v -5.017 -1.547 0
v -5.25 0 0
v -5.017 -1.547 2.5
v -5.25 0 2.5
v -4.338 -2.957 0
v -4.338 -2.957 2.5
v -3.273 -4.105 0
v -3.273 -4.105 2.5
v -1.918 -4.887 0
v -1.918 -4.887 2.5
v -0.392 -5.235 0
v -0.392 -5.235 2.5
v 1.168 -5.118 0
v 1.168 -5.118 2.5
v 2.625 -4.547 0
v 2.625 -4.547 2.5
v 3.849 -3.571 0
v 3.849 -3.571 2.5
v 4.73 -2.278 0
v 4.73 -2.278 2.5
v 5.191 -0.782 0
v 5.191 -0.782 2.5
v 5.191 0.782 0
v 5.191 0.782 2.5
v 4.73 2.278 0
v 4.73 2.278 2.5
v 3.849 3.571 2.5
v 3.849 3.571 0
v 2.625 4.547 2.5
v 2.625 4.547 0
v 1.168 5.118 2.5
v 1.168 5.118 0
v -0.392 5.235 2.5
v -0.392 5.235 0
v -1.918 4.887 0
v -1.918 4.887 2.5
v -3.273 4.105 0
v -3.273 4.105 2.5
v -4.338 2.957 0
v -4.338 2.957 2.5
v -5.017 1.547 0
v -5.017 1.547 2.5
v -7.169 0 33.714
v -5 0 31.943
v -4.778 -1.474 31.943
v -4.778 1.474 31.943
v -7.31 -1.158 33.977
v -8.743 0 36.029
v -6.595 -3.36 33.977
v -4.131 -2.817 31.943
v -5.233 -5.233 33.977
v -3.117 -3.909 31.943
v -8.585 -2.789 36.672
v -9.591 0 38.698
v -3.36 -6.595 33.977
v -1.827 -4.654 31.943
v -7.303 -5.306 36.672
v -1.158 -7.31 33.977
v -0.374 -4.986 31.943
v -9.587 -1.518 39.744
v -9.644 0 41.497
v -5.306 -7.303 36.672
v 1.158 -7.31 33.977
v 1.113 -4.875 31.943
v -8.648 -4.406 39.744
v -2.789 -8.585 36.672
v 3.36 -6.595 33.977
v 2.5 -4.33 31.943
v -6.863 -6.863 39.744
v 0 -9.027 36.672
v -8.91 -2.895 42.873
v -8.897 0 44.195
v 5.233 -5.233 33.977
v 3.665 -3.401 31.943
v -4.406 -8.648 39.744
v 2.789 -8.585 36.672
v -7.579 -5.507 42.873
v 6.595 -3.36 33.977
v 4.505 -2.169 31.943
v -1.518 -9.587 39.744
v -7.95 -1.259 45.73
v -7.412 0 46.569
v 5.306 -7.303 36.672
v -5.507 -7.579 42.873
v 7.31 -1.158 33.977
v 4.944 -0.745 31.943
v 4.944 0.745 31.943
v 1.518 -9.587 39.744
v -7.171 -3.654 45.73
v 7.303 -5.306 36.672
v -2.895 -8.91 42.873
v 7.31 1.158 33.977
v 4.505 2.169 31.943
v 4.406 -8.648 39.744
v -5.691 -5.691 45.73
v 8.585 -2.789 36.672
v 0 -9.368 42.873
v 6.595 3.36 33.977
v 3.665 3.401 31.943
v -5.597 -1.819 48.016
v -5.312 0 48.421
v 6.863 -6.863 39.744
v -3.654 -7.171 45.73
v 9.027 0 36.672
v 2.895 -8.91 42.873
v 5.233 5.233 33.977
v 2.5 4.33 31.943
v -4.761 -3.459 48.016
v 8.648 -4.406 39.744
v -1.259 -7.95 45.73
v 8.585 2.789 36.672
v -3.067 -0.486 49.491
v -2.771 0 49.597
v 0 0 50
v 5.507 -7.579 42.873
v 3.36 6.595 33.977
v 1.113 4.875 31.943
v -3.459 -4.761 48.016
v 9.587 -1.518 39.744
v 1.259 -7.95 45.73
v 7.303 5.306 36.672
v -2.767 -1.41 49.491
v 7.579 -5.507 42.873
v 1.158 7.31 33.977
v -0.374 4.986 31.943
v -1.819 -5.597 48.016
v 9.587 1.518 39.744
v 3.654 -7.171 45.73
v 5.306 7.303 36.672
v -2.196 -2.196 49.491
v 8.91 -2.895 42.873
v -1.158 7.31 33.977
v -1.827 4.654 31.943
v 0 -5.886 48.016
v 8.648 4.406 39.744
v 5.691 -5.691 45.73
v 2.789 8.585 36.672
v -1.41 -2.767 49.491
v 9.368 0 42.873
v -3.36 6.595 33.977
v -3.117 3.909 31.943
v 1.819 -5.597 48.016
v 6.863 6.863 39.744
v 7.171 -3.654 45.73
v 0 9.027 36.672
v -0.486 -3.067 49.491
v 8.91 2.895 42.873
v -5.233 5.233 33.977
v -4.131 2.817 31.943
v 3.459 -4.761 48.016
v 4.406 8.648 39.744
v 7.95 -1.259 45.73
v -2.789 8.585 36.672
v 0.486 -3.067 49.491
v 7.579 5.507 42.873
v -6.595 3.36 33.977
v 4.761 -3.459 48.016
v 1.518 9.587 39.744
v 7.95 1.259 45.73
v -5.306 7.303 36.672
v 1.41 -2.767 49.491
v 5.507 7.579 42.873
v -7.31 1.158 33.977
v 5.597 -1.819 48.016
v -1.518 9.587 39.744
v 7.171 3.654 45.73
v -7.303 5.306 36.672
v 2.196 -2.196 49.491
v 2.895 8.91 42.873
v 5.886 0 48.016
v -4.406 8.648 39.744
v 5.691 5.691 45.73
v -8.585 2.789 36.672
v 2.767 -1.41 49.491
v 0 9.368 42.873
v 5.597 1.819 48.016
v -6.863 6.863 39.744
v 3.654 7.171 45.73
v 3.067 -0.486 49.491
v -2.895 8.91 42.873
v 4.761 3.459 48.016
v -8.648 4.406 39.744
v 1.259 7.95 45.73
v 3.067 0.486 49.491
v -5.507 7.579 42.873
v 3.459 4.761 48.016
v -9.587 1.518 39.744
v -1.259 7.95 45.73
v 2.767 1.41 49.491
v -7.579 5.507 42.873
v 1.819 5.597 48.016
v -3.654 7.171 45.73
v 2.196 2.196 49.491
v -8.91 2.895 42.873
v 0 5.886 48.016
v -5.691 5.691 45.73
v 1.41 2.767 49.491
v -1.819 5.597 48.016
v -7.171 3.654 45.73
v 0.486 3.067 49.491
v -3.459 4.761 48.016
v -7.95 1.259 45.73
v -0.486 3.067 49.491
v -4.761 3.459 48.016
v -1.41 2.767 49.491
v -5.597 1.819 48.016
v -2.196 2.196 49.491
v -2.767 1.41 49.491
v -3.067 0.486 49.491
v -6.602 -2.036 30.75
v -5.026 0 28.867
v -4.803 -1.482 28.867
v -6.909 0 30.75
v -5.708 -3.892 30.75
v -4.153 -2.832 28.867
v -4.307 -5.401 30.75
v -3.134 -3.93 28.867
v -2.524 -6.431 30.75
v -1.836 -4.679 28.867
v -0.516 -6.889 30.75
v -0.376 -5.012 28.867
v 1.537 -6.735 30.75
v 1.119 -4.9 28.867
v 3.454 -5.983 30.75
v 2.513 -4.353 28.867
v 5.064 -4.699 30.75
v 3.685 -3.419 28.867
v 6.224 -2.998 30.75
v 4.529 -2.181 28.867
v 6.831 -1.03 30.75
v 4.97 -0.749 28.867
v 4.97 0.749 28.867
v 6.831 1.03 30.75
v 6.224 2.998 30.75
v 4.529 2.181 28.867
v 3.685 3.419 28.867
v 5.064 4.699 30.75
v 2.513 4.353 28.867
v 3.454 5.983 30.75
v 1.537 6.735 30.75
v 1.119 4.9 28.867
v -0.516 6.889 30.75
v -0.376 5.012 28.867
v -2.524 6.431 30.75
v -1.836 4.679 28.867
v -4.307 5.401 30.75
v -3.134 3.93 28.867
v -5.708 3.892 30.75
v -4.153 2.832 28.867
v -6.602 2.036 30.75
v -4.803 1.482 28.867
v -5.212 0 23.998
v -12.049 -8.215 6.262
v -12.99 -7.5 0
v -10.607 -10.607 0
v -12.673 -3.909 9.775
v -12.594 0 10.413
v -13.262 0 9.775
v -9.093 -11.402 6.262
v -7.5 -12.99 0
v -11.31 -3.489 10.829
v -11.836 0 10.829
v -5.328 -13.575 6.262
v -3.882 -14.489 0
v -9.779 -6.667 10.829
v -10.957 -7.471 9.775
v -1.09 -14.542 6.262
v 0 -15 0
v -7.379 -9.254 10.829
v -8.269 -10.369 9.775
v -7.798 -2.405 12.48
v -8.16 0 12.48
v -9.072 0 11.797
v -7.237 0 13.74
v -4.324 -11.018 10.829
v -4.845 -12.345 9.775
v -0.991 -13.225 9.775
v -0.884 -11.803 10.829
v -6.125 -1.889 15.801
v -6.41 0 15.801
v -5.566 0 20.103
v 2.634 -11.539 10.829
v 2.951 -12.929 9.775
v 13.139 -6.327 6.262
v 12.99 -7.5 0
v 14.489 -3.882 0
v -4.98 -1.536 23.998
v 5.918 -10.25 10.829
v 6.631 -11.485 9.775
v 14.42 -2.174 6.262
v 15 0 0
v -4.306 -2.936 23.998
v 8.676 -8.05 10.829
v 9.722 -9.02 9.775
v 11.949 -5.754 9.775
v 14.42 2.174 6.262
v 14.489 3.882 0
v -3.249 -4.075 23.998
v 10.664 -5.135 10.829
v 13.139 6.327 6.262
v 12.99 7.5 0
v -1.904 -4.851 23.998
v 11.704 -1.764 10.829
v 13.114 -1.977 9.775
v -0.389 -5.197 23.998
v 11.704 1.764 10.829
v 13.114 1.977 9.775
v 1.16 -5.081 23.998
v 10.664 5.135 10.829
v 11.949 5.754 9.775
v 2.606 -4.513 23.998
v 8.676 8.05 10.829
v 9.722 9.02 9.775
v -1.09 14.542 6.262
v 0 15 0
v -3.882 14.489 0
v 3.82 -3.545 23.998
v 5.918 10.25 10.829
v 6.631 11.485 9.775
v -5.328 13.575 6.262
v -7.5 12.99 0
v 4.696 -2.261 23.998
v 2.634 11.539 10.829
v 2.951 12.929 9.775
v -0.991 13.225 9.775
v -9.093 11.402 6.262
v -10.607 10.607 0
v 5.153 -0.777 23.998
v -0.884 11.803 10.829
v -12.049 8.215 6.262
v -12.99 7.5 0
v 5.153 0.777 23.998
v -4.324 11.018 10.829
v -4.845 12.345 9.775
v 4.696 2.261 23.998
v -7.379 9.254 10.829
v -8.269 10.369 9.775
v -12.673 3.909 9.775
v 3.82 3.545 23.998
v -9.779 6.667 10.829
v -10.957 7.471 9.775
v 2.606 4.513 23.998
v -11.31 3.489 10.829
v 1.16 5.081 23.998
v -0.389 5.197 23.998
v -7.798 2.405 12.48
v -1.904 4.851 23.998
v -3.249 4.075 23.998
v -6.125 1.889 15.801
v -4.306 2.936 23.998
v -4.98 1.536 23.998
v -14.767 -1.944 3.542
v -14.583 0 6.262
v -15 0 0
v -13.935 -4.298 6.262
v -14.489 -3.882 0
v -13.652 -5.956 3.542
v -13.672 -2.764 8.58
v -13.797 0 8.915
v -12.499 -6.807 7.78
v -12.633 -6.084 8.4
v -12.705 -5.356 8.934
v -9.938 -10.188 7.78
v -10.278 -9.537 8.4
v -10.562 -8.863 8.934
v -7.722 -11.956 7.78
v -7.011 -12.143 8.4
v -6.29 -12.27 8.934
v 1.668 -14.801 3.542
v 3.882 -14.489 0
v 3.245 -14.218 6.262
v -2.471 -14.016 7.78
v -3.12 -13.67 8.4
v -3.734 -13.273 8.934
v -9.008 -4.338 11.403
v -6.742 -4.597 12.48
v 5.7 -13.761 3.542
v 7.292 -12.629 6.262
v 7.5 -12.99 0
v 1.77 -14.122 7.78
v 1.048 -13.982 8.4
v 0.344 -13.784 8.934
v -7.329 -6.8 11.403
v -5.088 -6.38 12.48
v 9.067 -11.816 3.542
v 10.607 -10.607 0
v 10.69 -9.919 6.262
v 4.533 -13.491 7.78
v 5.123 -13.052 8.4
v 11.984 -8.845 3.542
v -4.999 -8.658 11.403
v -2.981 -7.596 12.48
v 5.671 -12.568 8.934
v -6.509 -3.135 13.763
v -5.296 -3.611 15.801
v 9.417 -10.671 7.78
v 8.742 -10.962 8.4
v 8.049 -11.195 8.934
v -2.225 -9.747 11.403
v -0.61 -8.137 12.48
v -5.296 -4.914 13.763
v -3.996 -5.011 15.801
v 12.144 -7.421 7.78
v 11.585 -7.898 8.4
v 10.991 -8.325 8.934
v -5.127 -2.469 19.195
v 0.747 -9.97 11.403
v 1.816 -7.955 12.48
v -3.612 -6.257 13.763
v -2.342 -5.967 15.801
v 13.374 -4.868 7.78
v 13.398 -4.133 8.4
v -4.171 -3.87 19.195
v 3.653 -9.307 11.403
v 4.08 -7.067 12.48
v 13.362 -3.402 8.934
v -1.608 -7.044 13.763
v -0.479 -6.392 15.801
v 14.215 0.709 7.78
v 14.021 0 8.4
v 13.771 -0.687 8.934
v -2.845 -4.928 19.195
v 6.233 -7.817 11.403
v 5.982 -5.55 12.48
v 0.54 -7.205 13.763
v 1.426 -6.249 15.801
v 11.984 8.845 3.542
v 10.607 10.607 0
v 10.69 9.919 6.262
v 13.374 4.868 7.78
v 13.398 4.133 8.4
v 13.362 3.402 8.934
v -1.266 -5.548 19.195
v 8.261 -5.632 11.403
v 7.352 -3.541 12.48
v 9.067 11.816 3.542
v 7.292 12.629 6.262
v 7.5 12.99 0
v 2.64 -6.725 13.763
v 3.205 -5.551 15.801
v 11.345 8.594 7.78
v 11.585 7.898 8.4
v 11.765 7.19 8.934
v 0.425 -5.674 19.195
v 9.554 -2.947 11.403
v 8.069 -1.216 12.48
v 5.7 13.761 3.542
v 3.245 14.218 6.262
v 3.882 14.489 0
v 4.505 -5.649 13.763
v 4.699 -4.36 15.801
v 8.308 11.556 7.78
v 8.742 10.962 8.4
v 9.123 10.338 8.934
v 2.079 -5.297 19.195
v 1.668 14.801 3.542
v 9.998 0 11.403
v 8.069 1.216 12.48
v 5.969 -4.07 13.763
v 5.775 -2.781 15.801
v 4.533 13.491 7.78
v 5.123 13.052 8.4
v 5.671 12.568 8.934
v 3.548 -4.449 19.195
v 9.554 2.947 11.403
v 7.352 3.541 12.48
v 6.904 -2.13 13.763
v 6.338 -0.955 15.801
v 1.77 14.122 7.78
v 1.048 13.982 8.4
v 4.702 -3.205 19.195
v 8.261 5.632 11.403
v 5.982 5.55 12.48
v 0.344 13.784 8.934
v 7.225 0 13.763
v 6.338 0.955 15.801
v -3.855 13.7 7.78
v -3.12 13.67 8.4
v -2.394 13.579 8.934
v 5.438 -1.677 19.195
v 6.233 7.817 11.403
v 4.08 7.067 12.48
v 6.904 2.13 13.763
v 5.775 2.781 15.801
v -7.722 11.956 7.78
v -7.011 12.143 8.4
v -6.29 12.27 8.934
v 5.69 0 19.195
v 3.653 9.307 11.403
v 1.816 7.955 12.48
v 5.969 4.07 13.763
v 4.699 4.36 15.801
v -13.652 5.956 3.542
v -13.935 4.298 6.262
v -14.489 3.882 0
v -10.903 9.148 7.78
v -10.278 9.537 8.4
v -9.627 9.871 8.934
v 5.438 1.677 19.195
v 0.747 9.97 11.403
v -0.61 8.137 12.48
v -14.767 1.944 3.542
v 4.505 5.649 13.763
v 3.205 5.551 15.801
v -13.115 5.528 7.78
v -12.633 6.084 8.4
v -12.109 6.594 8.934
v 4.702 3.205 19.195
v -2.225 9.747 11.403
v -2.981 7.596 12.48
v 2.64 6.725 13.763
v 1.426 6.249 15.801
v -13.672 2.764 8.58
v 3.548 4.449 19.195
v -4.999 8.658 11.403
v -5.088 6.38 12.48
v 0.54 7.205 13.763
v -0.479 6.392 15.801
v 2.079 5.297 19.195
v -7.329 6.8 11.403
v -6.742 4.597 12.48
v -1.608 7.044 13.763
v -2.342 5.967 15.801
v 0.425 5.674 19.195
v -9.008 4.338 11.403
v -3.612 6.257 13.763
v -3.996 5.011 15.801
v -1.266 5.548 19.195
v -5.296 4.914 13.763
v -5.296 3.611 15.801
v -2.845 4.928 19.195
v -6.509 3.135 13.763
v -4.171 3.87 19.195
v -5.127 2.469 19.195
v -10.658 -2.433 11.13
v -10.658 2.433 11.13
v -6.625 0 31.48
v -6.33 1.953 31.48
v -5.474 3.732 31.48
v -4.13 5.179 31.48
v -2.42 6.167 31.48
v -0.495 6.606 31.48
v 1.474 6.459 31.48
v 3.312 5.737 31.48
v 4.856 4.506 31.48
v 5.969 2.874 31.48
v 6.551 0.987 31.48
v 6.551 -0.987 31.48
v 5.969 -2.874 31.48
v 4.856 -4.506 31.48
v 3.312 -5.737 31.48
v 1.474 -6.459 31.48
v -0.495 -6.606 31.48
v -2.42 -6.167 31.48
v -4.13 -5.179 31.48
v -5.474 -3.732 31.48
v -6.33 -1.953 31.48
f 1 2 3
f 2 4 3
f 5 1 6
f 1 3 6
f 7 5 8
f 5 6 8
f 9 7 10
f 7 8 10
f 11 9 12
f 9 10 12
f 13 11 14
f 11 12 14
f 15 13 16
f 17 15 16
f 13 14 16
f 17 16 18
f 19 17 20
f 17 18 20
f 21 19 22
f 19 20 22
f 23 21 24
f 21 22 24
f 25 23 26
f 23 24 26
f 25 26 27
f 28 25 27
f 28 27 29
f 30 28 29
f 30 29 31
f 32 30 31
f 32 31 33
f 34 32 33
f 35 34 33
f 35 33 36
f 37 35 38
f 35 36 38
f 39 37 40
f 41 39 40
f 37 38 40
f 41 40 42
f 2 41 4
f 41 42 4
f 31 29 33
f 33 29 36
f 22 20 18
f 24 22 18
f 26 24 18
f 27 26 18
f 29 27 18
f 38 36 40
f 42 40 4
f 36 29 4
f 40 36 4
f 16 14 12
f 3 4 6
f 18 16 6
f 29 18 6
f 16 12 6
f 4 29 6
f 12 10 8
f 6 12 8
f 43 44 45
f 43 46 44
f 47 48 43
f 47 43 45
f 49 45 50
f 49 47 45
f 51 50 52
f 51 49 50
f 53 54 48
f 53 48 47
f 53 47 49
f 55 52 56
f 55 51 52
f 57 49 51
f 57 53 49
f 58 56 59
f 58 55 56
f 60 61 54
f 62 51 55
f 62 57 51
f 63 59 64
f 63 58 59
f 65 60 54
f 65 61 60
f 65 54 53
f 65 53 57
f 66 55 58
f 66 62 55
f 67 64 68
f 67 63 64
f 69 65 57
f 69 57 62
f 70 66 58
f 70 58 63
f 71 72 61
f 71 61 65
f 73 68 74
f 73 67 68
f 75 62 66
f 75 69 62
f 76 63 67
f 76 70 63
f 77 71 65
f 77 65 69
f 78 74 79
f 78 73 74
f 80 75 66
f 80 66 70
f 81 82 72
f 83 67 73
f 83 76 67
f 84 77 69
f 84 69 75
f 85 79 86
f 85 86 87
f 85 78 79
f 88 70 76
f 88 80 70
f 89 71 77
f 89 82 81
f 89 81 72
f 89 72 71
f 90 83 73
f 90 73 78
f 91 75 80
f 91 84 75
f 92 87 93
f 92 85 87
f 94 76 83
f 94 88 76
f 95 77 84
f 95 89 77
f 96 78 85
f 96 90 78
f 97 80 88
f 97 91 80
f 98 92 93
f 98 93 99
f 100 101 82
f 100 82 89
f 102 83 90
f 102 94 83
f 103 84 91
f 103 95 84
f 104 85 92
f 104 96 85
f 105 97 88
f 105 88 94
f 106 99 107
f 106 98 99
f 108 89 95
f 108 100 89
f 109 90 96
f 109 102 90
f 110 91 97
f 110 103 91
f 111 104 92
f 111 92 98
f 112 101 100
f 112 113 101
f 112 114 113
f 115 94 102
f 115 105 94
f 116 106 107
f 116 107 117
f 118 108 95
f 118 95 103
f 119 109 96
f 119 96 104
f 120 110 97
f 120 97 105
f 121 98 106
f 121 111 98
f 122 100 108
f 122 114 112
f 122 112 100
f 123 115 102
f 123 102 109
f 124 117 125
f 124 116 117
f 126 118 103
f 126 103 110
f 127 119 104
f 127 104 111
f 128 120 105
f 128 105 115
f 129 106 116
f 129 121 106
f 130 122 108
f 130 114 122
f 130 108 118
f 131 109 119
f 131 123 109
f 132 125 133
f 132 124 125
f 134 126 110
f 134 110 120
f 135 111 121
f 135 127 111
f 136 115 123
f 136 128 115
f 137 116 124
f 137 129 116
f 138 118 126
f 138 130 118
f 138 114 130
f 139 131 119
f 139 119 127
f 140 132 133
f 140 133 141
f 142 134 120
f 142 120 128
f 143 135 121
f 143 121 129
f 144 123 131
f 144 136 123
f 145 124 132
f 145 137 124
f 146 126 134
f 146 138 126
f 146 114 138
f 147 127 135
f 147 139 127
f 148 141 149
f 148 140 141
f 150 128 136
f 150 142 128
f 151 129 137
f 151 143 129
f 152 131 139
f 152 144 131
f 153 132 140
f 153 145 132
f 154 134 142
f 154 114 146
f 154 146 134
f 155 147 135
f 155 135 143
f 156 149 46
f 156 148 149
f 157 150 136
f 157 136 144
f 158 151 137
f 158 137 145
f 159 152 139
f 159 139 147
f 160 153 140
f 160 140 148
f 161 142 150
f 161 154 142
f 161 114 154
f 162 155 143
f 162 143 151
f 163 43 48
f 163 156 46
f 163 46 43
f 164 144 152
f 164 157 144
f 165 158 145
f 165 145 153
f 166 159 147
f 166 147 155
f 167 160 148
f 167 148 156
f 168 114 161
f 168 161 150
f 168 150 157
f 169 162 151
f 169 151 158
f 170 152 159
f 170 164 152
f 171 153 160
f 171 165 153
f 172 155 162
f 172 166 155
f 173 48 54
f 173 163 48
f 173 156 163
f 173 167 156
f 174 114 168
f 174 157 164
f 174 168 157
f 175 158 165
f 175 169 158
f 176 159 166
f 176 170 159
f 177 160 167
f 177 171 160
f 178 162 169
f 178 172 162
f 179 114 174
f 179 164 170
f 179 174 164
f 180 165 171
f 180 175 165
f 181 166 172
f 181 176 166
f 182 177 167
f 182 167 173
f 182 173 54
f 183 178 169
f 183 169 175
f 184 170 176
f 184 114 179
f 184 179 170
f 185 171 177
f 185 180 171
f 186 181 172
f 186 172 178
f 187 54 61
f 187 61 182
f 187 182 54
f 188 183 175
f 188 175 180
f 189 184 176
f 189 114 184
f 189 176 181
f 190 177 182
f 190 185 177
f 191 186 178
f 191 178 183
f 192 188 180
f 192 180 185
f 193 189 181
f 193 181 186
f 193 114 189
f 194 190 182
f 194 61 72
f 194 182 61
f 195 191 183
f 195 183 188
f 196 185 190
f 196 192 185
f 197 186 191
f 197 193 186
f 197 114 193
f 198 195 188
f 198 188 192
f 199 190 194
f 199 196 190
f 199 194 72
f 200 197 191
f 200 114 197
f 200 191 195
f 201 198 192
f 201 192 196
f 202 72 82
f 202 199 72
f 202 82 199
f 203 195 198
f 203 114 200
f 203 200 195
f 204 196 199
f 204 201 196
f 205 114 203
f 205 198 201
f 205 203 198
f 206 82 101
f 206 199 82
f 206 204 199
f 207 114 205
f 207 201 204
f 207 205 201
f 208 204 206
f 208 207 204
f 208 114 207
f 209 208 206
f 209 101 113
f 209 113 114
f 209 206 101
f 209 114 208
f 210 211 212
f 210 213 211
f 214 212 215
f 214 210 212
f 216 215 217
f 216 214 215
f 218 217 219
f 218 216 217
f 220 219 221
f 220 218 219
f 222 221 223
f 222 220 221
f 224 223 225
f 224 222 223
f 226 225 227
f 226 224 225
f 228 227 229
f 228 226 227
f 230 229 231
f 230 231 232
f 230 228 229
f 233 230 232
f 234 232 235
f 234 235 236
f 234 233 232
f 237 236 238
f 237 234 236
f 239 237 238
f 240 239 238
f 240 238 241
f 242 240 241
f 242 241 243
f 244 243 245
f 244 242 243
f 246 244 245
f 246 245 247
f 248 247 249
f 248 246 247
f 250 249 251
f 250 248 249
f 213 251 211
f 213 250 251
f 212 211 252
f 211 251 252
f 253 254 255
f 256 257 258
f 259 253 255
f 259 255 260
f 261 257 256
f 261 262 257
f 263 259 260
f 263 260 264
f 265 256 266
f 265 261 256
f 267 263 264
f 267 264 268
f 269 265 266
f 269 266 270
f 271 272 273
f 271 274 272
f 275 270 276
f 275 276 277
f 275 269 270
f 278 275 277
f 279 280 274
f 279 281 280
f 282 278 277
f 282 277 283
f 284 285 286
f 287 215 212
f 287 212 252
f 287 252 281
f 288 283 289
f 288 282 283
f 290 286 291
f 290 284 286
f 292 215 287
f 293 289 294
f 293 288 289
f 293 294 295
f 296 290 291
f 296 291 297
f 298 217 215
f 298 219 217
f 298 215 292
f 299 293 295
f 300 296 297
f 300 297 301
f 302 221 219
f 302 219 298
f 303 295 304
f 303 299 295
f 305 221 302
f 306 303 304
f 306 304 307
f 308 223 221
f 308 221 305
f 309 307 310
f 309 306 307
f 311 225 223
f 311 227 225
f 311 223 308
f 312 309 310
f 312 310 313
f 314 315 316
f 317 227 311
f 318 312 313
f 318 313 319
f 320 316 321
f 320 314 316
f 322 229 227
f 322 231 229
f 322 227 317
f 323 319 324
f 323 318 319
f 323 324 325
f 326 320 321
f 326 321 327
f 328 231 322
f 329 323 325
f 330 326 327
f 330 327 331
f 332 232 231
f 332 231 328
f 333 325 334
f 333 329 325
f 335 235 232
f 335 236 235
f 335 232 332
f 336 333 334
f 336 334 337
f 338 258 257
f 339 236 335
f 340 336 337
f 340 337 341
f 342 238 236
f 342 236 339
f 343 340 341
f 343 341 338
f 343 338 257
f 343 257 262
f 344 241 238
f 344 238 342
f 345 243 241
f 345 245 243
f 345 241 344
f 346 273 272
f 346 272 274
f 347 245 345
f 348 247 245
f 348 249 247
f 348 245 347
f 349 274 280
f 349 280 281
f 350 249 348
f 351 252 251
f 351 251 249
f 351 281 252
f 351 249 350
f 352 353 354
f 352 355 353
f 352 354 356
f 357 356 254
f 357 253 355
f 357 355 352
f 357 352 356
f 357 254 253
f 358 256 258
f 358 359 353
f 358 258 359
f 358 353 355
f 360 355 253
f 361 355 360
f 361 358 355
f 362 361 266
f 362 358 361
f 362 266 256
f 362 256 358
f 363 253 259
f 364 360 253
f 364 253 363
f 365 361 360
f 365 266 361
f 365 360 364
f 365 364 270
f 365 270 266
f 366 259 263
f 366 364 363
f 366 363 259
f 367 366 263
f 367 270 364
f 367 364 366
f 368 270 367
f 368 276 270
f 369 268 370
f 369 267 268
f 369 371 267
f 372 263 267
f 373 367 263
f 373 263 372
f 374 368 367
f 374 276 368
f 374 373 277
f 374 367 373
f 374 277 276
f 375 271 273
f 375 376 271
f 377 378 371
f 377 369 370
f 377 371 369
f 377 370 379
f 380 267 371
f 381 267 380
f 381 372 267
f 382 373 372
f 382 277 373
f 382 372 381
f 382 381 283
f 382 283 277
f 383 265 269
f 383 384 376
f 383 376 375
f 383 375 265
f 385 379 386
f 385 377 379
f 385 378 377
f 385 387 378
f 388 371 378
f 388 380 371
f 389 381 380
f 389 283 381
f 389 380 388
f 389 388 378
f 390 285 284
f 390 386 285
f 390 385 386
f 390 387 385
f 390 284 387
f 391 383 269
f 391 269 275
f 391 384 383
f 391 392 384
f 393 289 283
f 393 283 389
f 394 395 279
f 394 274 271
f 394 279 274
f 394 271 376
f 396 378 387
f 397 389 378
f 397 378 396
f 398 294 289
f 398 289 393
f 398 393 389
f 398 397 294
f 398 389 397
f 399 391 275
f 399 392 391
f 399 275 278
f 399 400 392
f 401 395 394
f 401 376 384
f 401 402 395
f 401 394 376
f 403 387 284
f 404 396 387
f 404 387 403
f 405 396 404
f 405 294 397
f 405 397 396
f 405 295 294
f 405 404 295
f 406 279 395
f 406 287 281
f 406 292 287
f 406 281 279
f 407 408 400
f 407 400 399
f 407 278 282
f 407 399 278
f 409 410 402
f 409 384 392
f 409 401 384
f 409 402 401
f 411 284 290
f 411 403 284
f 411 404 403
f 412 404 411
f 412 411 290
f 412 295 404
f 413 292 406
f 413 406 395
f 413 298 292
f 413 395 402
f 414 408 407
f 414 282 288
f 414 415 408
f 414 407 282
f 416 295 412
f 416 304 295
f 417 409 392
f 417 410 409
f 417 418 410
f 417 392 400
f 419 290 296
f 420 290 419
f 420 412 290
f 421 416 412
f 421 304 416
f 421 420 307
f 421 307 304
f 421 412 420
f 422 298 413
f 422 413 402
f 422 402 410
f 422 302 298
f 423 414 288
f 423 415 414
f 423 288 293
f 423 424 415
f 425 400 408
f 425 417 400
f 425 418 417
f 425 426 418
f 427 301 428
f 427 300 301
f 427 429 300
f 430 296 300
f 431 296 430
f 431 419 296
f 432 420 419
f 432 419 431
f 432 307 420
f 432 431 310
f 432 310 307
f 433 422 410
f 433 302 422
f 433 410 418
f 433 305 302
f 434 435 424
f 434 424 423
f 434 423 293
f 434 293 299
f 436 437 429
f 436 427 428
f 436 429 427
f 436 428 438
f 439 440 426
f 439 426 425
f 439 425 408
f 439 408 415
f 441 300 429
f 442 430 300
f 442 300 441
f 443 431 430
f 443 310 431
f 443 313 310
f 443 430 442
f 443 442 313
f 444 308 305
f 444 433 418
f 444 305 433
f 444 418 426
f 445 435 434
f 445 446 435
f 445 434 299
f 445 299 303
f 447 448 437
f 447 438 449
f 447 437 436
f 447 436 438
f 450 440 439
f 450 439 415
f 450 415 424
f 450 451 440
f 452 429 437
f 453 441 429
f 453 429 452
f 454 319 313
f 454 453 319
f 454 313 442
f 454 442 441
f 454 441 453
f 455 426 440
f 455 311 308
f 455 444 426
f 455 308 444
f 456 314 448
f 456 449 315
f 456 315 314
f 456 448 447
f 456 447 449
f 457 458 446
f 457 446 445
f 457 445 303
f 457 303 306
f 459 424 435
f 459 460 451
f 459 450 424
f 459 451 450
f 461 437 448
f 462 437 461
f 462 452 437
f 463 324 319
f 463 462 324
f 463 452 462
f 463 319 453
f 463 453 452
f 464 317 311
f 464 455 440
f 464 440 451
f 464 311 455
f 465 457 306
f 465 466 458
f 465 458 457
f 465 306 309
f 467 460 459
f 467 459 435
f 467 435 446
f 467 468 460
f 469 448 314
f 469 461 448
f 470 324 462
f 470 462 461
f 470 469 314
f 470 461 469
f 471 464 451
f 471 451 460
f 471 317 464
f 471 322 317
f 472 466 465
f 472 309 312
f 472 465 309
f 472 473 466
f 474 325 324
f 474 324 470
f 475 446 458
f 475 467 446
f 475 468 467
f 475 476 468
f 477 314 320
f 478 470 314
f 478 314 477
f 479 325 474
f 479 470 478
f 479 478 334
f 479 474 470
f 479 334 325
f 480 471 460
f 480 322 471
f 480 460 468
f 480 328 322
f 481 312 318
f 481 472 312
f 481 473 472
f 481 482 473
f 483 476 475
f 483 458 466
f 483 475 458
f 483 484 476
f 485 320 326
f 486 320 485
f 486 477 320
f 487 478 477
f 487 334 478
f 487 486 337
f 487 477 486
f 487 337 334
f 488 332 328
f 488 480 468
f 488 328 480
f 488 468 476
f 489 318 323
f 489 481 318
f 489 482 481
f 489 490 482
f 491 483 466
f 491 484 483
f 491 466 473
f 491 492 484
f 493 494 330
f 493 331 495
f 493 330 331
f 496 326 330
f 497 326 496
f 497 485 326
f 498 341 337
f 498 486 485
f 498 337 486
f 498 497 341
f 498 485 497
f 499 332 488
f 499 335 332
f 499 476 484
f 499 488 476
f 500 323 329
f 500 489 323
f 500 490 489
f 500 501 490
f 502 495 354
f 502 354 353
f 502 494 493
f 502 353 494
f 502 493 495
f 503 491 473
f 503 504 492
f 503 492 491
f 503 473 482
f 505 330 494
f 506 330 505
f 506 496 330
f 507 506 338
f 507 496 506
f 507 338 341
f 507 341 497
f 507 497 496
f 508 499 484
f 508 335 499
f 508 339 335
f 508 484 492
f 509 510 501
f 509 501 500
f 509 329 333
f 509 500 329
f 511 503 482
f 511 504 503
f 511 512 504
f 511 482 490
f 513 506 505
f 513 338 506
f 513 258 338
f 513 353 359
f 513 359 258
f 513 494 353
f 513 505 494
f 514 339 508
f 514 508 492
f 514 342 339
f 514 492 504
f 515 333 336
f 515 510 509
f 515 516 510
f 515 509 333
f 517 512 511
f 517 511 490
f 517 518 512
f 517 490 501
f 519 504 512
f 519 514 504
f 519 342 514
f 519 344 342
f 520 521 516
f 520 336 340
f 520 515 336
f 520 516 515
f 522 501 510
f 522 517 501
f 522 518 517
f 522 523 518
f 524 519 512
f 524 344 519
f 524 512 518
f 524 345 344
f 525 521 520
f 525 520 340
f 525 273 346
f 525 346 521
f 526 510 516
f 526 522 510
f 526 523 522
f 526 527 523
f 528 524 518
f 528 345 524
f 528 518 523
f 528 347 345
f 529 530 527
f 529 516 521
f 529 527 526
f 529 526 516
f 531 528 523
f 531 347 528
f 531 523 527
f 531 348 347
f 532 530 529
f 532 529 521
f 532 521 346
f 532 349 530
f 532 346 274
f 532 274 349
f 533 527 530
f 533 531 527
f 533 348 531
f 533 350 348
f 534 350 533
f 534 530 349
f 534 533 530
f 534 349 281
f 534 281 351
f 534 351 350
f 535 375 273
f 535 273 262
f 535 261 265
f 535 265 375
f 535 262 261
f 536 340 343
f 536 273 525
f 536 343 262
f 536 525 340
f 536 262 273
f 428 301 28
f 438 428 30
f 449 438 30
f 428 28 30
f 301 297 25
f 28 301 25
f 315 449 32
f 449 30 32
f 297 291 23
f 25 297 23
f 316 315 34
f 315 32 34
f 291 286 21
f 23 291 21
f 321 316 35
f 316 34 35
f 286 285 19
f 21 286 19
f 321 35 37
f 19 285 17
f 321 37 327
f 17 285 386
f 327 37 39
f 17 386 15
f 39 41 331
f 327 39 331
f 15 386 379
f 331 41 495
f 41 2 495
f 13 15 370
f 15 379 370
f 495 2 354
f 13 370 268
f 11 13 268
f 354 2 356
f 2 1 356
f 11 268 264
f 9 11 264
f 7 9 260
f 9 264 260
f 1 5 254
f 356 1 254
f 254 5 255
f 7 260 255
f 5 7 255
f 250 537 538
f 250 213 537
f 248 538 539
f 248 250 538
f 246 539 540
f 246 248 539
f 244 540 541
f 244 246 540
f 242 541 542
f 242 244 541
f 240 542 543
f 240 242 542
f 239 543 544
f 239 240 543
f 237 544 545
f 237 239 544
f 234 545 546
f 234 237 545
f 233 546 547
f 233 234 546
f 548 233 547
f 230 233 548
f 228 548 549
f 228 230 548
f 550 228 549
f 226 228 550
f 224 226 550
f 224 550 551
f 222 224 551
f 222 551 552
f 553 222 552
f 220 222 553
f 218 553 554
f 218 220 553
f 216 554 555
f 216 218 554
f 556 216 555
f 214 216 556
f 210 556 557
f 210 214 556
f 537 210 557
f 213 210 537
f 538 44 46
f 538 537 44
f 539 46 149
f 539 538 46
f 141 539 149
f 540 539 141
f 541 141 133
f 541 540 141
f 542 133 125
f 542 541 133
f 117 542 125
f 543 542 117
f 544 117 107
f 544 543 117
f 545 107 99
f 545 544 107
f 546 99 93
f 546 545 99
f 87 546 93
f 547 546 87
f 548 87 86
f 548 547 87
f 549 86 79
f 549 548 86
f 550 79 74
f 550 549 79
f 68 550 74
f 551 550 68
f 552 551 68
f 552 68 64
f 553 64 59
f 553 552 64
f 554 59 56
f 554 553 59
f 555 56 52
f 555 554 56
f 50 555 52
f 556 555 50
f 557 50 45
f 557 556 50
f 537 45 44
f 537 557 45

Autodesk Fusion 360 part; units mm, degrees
sketch "Sketch1" plane through (0, 0, 0) normal (0, 1, 0) x (1, 0, 0)
  line L0 (0, 0) -> (-15, 0)
  spline S0 degree 5 poles (-15, 0) (-15, -2.4594) (-14.7958, -6.5576) (-13.8775, -10.2456) (-11.6701, -11.3146) (-8.3299, -11.1548) (-6.1225, -14.3711) (-5.2042, -21.1026) (-5, -27.9377) (-5, -31.9428) knots 0 0 0 0 0 0 0.2 0.4 0.6 0.8 1 1 1 1 1 1
  line L1 (-15, 5) -> (-15, -5)
  line L2 (0, 0) -> (0, -50)
  line L3 (-5, -23.8005) -> (-5, -40.085)
  line L4 (-5, -31.9428) -> (-6.6248, -31.4797)
  line L5 (-6.9086, -30.7495) -> (-5.0265, -28.8674)
  arc A0 (0, -30.5583) -> (0, -50) centre (0, -40.2791) ccw
  line L6 (-6.6248, -31.4797) -> (-6.9086, -30.7495)
  line L7 (-5.25, 0) -> (-5.25, -2.5)
  line L8 (-5.25, -2.5) -> (0, -2.5)
  dimension "d2" = 15
  dimension "d4" = 50
  dimension "d5" = 45
  dimension "d10" = 5
  dimension "d11" = 2.5
  dimension "d12" = 5.25
revolve "Revolve1" add sketch "Sketch1" angle 360 about axis through (0, 0, 0) along (0, 0, 1) contours L0 S0 L2 A0 L7 L8 | L2 A0 | S0 L4 L5 L6
equation "d2 = 1 / 2 * 3 cm"
